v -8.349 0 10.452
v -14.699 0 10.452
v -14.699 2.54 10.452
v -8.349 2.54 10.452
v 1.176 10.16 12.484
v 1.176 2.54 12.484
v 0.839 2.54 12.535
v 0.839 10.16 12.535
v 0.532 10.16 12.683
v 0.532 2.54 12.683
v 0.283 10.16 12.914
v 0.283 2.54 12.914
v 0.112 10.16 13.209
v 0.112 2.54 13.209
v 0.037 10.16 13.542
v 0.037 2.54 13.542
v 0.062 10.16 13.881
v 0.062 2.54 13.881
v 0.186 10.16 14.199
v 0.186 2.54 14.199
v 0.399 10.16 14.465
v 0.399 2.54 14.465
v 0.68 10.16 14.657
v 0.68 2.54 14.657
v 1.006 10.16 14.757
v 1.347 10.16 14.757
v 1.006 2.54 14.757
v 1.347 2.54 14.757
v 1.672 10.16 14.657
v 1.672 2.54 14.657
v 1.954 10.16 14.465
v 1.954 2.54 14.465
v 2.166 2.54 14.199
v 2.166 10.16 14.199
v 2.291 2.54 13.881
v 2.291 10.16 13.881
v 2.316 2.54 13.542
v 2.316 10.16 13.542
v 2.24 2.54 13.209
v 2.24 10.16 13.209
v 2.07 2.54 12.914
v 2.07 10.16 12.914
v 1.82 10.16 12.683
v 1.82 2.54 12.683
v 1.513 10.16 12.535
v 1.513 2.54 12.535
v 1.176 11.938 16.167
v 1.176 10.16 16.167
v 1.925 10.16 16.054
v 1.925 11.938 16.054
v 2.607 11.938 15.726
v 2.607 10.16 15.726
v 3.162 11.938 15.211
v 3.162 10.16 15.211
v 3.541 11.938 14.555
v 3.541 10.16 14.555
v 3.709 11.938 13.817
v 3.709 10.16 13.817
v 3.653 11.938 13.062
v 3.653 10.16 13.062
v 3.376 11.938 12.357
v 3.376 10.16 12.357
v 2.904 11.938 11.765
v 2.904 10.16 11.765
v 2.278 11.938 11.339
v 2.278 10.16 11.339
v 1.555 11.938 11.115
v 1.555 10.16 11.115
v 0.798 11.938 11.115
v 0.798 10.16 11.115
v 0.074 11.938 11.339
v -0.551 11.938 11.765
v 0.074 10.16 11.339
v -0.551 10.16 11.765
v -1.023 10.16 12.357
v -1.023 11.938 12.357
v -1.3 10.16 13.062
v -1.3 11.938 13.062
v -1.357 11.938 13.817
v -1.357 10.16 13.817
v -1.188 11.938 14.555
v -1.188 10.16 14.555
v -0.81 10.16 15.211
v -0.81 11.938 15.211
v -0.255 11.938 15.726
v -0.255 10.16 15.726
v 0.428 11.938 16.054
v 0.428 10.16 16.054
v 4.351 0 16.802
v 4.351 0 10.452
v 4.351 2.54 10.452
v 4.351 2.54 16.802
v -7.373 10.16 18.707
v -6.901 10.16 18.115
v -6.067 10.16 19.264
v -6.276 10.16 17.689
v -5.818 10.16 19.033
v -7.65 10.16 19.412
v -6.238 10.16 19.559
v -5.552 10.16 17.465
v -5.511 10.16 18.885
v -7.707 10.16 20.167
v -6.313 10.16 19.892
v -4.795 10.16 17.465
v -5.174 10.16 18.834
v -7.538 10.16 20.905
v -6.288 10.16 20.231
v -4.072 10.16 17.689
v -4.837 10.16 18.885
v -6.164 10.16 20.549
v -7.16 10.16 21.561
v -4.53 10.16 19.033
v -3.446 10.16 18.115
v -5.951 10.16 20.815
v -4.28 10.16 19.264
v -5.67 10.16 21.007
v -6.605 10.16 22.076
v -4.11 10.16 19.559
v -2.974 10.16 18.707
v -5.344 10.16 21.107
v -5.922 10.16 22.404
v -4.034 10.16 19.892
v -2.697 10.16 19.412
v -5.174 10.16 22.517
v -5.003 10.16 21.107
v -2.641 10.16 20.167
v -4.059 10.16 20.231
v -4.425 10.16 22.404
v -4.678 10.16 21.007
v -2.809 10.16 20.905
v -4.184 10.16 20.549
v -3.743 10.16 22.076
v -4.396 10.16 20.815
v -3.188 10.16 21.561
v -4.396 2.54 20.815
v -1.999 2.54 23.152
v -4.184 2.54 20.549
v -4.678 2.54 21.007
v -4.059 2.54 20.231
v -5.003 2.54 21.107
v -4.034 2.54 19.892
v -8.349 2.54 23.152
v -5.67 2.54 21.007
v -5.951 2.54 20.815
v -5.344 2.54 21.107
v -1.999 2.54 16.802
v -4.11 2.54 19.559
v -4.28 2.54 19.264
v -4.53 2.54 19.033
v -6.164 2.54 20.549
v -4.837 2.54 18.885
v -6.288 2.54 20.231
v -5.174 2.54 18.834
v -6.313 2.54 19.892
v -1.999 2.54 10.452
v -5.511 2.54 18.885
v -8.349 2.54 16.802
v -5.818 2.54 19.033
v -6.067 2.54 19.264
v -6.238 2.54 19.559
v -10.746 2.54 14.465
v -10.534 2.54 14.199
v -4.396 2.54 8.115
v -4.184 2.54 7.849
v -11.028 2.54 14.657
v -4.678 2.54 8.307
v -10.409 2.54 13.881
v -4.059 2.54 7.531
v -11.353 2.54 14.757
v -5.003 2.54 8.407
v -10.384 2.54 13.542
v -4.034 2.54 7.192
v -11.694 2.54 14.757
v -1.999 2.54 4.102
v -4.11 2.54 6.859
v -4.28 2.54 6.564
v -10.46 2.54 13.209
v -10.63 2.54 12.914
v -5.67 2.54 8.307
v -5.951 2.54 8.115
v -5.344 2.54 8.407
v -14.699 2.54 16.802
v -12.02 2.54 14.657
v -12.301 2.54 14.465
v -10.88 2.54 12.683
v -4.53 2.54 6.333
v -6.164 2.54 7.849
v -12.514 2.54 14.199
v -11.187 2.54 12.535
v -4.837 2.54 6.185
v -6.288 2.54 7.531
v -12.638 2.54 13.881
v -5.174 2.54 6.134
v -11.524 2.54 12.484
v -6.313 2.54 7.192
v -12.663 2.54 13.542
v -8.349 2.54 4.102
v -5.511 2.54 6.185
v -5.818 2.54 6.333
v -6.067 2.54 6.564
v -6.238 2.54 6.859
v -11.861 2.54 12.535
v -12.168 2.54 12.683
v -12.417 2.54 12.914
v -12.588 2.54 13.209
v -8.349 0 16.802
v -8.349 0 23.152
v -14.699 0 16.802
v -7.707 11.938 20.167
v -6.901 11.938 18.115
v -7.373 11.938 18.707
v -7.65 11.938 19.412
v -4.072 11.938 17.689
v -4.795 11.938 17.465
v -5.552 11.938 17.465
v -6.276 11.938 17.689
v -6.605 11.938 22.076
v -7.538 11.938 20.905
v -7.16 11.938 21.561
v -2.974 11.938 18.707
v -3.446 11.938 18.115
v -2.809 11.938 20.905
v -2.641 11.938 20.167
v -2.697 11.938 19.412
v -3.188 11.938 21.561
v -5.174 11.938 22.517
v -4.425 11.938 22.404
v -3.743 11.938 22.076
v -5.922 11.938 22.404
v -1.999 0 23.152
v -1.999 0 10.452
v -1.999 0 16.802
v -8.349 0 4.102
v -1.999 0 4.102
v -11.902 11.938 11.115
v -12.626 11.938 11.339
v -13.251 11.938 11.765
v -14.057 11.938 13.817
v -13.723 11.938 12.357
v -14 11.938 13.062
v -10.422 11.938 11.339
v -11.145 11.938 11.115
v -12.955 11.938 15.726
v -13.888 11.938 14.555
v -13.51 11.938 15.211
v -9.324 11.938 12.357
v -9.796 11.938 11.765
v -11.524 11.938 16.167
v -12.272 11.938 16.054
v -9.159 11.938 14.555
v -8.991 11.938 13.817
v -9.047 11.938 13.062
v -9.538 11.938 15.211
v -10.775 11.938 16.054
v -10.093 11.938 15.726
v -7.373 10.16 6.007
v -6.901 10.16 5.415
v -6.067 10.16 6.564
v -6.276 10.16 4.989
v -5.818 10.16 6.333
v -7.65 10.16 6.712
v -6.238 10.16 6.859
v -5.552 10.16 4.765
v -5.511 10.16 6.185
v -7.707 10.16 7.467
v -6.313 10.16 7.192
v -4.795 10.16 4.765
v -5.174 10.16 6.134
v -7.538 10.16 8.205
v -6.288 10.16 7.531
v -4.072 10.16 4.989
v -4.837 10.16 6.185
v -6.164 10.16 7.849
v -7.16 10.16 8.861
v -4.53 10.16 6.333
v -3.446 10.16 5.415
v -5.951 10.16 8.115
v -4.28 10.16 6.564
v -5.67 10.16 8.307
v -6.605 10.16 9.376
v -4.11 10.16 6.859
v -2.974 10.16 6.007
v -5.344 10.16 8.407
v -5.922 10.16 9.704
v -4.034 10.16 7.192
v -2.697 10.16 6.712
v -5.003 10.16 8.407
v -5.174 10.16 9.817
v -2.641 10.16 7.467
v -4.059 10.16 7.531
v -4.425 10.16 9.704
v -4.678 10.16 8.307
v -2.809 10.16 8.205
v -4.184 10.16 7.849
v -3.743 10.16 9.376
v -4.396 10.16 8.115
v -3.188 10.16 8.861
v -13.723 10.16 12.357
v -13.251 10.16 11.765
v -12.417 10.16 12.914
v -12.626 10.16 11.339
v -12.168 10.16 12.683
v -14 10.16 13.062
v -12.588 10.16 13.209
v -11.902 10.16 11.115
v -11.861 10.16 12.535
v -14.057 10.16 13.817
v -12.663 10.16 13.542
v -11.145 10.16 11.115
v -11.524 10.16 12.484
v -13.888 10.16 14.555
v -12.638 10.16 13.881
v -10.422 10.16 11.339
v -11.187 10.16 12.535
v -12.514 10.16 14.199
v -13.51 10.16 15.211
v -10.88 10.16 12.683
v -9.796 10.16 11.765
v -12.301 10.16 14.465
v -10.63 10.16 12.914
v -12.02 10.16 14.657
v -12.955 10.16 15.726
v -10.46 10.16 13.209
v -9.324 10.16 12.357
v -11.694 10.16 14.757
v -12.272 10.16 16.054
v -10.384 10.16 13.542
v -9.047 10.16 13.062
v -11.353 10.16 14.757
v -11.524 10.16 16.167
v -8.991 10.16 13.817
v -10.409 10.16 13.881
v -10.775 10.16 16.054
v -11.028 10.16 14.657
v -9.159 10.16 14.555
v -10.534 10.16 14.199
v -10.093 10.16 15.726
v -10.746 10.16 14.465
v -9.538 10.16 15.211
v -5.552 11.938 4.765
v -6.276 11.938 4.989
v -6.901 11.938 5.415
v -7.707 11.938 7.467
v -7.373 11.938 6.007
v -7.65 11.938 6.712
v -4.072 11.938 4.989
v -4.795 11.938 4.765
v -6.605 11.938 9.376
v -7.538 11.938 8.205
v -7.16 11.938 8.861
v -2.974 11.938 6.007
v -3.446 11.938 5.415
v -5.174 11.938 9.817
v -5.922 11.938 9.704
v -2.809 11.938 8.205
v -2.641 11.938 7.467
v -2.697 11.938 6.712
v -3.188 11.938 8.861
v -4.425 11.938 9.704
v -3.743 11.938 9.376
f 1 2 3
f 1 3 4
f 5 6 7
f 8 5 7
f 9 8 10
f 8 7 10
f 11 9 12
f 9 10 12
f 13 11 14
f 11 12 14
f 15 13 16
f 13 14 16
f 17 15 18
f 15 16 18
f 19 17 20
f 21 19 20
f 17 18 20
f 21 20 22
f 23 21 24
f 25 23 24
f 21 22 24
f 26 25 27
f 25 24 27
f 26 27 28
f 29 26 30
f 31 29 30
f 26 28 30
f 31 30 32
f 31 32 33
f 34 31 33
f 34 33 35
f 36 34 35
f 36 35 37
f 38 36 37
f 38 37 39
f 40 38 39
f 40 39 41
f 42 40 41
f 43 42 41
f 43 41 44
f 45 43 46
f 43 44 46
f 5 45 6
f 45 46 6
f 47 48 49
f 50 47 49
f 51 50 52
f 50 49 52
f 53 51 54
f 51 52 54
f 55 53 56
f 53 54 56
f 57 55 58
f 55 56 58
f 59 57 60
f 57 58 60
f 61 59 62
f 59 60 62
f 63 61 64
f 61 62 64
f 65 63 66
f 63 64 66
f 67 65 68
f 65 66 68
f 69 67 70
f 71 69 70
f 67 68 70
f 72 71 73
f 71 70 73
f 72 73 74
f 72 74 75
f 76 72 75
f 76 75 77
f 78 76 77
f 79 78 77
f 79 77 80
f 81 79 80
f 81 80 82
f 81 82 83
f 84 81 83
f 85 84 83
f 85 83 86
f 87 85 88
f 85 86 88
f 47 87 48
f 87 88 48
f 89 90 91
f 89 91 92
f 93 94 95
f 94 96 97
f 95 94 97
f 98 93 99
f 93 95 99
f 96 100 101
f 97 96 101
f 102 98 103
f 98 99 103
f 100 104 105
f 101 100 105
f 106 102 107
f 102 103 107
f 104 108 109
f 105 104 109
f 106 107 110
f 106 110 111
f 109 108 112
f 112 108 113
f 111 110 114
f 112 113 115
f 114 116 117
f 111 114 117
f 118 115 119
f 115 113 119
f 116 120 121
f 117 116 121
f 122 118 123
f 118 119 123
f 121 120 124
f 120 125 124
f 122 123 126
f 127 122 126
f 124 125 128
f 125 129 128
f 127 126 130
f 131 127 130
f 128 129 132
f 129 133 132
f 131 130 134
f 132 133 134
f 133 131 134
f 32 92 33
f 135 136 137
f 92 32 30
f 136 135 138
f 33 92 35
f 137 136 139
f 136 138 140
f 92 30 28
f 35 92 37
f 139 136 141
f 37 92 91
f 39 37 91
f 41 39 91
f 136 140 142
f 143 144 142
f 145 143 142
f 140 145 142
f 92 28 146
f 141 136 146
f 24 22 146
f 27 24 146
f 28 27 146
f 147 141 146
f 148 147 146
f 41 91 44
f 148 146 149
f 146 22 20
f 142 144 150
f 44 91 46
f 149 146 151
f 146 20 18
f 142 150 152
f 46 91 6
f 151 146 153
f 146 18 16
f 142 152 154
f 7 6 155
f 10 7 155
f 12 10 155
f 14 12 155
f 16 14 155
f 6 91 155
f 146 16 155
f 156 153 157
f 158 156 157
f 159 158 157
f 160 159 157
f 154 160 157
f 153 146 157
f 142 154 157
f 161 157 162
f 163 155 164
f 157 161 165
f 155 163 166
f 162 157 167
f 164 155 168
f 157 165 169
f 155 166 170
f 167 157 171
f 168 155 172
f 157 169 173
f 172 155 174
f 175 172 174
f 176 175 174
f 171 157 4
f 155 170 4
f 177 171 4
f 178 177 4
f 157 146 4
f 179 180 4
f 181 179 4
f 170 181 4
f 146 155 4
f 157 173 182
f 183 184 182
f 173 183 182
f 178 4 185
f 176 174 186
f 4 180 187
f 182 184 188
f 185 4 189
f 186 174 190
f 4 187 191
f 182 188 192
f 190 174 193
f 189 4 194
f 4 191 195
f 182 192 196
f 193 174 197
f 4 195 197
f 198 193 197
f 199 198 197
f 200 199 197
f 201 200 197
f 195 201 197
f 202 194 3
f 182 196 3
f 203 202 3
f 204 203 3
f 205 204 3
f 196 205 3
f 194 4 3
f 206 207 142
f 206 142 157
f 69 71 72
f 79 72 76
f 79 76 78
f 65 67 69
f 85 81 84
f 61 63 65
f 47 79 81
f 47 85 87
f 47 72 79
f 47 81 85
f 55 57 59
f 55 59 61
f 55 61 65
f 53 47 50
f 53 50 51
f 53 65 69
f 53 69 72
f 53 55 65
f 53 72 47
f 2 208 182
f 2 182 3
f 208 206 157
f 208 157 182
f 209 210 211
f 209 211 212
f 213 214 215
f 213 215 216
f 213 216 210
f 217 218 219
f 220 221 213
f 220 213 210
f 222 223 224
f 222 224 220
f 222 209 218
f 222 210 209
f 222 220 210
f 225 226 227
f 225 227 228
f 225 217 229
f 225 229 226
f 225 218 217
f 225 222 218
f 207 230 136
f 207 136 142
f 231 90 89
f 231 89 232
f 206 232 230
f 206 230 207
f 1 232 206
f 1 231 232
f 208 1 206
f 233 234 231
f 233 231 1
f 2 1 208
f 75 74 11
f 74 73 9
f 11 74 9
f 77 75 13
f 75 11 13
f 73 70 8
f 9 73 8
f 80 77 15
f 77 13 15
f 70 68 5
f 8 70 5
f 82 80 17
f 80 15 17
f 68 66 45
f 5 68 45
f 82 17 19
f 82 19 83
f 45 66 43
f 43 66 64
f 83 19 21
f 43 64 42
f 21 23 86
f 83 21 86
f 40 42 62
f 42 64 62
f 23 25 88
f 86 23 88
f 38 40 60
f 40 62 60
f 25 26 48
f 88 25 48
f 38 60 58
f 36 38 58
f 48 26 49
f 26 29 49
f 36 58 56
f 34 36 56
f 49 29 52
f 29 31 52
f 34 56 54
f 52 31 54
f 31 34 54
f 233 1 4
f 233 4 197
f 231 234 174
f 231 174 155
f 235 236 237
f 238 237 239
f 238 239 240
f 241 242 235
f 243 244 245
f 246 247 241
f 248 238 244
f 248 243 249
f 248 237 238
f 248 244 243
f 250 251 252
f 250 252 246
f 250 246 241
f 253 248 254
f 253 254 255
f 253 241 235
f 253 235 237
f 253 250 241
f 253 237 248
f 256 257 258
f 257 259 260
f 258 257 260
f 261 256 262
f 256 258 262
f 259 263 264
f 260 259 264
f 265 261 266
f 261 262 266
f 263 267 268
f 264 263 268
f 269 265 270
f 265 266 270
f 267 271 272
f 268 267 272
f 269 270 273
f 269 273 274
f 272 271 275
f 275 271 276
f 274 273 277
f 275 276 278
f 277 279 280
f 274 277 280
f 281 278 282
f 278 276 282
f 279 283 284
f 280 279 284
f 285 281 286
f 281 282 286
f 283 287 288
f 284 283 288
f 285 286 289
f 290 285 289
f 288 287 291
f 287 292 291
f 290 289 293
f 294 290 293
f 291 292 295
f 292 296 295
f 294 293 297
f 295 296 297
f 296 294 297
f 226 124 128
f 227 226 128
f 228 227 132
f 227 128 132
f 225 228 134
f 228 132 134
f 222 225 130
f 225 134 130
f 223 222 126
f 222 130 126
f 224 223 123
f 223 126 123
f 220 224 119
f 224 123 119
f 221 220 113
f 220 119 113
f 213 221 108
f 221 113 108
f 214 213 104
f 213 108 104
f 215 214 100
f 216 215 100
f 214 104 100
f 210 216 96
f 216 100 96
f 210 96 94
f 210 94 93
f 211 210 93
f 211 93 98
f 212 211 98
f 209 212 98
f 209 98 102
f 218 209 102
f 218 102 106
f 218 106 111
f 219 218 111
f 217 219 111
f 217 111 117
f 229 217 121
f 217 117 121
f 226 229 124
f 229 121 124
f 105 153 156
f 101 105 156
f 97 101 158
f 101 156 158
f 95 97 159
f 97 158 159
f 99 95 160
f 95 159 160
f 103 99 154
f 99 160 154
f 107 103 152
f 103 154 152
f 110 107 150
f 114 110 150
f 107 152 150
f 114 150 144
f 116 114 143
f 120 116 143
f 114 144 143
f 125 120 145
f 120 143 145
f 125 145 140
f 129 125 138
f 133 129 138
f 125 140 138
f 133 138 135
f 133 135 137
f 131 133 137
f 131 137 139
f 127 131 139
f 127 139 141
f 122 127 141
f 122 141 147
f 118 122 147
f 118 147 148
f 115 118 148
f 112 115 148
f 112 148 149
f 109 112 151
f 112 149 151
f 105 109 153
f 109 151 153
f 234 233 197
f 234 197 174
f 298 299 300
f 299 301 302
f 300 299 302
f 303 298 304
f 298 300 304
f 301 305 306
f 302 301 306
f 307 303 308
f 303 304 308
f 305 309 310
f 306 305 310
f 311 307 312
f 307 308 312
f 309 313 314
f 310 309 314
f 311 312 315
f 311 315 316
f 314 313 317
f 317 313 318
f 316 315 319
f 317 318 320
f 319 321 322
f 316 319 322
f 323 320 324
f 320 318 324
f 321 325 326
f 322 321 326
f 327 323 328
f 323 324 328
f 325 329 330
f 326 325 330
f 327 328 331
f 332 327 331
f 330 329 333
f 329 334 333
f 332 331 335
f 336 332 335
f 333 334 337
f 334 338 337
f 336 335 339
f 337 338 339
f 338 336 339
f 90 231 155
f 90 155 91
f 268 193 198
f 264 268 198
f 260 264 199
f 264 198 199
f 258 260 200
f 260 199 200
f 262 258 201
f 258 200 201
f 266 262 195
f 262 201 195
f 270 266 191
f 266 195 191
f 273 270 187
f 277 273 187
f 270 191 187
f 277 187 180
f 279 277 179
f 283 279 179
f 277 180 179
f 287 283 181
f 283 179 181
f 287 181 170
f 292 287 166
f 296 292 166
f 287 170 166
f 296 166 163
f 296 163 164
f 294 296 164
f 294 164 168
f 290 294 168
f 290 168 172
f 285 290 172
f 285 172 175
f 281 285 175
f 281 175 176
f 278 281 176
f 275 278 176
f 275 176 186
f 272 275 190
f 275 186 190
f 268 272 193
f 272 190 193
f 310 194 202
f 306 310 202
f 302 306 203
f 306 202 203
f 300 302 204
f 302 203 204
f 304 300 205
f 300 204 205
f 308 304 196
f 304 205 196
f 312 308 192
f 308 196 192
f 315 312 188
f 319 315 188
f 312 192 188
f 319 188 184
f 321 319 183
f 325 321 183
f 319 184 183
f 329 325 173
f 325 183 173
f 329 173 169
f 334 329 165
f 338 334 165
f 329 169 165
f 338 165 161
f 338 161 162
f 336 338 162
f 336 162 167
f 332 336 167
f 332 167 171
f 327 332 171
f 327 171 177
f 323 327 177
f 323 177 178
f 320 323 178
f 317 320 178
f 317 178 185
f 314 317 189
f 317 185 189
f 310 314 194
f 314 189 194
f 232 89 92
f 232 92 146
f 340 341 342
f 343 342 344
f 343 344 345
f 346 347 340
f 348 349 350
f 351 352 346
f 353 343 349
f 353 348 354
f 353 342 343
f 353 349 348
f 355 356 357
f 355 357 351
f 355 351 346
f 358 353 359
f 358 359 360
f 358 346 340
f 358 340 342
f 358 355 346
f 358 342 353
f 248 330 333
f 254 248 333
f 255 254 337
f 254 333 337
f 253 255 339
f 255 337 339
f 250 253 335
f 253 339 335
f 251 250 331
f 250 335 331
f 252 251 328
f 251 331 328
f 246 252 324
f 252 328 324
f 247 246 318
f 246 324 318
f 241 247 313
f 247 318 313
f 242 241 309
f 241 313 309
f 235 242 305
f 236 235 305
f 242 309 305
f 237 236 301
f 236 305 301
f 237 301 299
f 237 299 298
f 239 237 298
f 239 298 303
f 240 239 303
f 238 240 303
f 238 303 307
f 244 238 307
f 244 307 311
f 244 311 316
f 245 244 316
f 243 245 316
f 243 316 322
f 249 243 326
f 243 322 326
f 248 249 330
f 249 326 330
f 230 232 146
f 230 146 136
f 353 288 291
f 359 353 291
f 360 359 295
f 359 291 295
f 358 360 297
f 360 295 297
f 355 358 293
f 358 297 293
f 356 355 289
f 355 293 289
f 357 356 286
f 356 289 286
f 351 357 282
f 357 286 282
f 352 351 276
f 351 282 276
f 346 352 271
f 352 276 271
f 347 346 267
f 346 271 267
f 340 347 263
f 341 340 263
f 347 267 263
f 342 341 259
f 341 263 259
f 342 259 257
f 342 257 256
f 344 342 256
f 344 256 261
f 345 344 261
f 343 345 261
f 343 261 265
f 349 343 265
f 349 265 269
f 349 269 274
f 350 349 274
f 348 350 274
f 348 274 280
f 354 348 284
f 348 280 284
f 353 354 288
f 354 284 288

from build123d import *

# Parameters (mm, degrees)
BODY_DEPTH = 2.54
SKETCH2_R  = 1.143
FLAG_DEPTH = 7.62
SKETCH3_R  = 2.54
FEET_DEPTH = 1.778


with BuildPart() as part:
    # Sketch1 → body (new body)
    with BuildSketch(Plane(origin=(0, 0, 0), x_dir=(1, 0, 0), z_dir=(0, 1, 0))):
        Polygon((-8.348684361, -10.452067183), (-8.348684361, -4.102067183), (-1.998684361, -4.102067183), (-1.998684361, -10.452067183), (4.351315639, -10.452067183), (4.351315639, -16.802067183), (-1.998684361, -16.802067183), (-1.998684361, -23.152067183), (-8.348684361, -23.152067183), (-8.348684361, -16.802067183), (-14.698684361, -16.802067183), (-14.698684361, -10.452067183), align=None)
    extrude(amount=BODY_DEPTH)

    # Sketch2 → flag (add)
    with BuildSketch(Plane(origin=(0, 2.54, 0), x_dir=(1, 0, 0), z_dir=(0, 1, 0))):
        with Locations(Location((-5.173684361, -7.277067183, 0), (0, 0, 90))):
            Circle(SKETCH2_R)
        with Locations(Location((1.176315639, -13.627067183, 0), (0, 0, 90))):
            Circle(SKETCH2_R)
        with Locations(Location((-5.173684361, -19.977067183, 0), (0, 0, 90))):
            Circle(SKETCH2_R)
        with Locations(Location((-11.523684361, -13.627067183, 0), (0, 0, 90))):
            Circle(SKETCH2_R)
    extrude(amount=FLAG_DEPTH)

    # Sketch3 → feet (add)
    with BuildSketch(Plane(origin=(0, 10.16, 0), x_dir=(1, 0, 0), z_dir=(0, 1, 0))):
        with Locations(Location((-5.173684361, -7.277067183, 0), (0, 0, 270))):
            Circle(SKETCH3_R)
        with Locations(Location((-11.523684361, -13.627067183, 0), (0, 0, 270))):
            Circle(SKETCH3_R)
        with Locations(Location((-5.173684361, -19.977067183, 0), (0, 0, 270))):
            Circle(SKETCH3_R)
        with Locations(Location((1.176315639, -13.627067183, 0), (0, 0, 270))):
            Circle(SKETCH3_R)
    extrude(amount=FEET_DEPTH)


solid = part.part
